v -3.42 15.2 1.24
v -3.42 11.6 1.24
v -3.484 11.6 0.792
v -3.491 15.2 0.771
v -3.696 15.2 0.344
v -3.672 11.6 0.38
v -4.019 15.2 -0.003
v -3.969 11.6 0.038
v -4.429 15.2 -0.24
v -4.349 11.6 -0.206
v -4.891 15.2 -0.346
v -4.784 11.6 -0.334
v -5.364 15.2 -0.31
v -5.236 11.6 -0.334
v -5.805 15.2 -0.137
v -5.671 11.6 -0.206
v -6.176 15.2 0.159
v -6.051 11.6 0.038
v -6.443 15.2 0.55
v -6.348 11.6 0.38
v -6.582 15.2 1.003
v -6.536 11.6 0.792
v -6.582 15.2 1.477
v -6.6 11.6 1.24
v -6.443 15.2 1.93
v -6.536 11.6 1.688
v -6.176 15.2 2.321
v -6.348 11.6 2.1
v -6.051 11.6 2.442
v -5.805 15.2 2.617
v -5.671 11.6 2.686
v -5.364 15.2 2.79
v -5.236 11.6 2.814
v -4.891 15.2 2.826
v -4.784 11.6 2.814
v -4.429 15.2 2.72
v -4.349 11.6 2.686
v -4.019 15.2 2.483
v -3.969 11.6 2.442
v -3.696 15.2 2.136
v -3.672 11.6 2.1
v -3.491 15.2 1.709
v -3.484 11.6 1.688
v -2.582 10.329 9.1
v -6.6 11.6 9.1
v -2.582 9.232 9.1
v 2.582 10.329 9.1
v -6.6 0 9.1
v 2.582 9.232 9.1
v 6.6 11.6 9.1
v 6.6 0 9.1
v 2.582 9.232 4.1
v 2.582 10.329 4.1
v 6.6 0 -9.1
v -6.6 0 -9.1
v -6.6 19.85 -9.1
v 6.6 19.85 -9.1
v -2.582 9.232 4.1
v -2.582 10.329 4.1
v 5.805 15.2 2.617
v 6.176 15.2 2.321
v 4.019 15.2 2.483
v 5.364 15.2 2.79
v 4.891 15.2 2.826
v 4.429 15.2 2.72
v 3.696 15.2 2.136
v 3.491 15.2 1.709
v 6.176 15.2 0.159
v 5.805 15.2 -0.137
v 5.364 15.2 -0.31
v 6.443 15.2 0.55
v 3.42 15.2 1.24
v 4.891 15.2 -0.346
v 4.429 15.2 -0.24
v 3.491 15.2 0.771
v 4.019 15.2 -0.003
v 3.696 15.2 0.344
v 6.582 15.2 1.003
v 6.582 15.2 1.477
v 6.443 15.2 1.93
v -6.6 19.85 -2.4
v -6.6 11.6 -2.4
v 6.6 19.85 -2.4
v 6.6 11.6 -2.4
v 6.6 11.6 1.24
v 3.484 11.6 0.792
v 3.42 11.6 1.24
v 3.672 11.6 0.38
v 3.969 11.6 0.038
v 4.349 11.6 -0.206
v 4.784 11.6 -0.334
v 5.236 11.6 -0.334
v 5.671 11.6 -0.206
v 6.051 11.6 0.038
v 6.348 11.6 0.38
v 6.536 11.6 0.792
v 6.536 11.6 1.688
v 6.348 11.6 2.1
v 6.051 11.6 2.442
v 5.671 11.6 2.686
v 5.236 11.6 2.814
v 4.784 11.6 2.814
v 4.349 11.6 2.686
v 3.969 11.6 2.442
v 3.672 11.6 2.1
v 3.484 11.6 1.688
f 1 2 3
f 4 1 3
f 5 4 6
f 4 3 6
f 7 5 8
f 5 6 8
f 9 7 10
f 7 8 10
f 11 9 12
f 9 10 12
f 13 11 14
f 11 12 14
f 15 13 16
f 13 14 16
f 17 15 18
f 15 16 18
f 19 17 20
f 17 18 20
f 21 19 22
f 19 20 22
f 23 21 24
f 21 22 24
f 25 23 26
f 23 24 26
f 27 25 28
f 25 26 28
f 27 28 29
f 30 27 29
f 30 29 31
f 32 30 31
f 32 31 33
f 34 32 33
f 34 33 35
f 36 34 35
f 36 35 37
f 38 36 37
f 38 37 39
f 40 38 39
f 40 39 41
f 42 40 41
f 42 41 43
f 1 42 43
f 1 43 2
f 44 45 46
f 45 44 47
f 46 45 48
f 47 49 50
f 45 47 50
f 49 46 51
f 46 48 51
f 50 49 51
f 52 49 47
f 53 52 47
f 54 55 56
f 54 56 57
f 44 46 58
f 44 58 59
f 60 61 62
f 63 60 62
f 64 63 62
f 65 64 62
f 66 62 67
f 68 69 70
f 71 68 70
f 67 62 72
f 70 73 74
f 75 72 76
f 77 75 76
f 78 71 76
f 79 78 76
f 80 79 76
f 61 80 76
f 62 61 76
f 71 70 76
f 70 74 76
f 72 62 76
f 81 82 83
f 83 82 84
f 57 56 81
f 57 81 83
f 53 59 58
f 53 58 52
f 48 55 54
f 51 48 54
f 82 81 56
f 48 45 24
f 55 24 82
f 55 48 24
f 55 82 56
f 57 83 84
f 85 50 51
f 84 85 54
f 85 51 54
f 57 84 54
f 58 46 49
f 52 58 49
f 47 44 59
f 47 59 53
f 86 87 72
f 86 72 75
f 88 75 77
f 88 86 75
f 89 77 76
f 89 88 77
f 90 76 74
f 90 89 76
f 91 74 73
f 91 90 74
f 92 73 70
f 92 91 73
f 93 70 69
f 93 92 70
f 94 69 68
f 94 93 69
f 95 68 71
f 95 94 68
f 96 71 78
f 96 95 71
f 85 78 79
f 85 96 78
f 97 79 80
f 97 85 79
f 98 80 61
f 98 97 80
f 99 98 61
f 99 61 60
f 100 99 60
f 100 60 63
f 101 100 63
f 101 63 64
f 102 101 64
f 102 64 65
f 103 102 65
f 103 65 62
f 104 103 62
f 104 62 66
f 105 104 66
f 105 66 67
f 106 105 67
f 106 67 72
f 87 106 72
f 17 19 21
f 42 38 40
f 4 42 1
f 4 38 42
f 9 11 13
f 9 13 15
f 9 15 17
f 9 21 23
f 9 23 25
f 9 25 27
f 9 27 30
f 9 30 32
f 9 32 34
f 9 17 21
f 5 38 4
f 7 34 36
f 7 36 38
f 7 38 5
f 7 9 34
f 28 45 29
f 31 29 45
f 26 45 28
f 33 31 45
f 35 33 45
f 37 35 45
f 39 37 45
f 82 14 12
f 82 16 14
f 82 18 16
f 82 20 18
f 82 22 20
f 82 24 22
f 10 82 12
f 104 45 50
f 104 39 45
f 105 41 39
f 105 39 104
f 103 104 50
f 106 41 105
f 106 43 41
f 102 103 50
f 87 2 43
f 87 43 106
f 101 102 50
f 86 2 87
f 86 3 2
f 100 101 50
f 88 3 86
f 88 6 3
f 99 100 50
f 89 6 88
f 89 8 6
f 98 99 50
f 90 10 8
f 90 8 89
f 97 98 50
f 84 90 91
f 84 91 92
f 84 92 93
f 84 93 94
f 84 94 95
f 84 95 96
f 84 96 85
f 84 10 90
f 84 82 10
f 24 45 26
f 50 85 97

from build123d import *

# Parameters (mm, degrees)
SKETCH1_W           = 13.2
SKETCH1_H           = 18.2
BOSS_EXTRUDE1_DEPTH = 11.6
SKETCH2_R           = 1.59
BOSS_EXTRUDE2_DEPTH = 3.6
SKETCH3_W           = 13.2
SKETCH3_H           = 6.7
BOSS_EXTRUDE3_DEPTH = 8.25
SKETCH4_W           = 5.164958048
SKETCH4_H           = 1.096471541
CUT_EXTRUDE1_DEPTH  = 5


with BuildPart() as part:
    # Sketch1 → Boss-Extrude1 (new body)
    with BuildSketch(Plane(origin=(0, 0, 0), x_dir=(1, 0, 0), z_dir=(0, 1, 0))):
        Rectangle(SKETCH1_W, SKETCH1_H)
    extrude(amount=BOSS_EXTRUDE1_DEPTH)

    # Sketch2 → Boss-Extrude2 (add)
    with BuildSketch(Plane(origin=(0, 11.6, 0), x_dir=(1, 0, 0), z_dir=(0, 1, 0))):
        with Locations((-5.01, -1.24)):
            Circle(SKETCH2_R)
    boss_extrude2 = extrude(amount=BOSS_EXTRUDE2_DEPTH)

    # Mirror1: Boss-Extrude2 across plane
    add(boss_extrude2.mirror(Plane(origin=(0, 0, 0), x_dir=(0, 0, 1), z_dir=(1, 0, 0))))

    # Sketch3 → Boss-Extrude3 (add)
    with BuildSketch(Plane(origin=(0, 11.6, 0), x_dir=(1, 0, 0), z_dir=(0, 1, 0))):
        with Locations((0, 5.75)):
            Rectangle(SKETCH3_W, SKETCH3_H)
    extrude(amount=BOSS_EXTRUDE3_DEPTH)

    # Sketch4 → Cut-Extrude1 (cut)
    with BuildSketch(Plane.XY.offset(9.1)):
        with Locations((0, 9.780727429)):
            Rectangle(SKETCH4_W, SKETCH4_H)
    extrude(amount=-CUT_EXTRUDE1_DEPTH, mode=Mode.SUBTRACT)


solid = part.part
